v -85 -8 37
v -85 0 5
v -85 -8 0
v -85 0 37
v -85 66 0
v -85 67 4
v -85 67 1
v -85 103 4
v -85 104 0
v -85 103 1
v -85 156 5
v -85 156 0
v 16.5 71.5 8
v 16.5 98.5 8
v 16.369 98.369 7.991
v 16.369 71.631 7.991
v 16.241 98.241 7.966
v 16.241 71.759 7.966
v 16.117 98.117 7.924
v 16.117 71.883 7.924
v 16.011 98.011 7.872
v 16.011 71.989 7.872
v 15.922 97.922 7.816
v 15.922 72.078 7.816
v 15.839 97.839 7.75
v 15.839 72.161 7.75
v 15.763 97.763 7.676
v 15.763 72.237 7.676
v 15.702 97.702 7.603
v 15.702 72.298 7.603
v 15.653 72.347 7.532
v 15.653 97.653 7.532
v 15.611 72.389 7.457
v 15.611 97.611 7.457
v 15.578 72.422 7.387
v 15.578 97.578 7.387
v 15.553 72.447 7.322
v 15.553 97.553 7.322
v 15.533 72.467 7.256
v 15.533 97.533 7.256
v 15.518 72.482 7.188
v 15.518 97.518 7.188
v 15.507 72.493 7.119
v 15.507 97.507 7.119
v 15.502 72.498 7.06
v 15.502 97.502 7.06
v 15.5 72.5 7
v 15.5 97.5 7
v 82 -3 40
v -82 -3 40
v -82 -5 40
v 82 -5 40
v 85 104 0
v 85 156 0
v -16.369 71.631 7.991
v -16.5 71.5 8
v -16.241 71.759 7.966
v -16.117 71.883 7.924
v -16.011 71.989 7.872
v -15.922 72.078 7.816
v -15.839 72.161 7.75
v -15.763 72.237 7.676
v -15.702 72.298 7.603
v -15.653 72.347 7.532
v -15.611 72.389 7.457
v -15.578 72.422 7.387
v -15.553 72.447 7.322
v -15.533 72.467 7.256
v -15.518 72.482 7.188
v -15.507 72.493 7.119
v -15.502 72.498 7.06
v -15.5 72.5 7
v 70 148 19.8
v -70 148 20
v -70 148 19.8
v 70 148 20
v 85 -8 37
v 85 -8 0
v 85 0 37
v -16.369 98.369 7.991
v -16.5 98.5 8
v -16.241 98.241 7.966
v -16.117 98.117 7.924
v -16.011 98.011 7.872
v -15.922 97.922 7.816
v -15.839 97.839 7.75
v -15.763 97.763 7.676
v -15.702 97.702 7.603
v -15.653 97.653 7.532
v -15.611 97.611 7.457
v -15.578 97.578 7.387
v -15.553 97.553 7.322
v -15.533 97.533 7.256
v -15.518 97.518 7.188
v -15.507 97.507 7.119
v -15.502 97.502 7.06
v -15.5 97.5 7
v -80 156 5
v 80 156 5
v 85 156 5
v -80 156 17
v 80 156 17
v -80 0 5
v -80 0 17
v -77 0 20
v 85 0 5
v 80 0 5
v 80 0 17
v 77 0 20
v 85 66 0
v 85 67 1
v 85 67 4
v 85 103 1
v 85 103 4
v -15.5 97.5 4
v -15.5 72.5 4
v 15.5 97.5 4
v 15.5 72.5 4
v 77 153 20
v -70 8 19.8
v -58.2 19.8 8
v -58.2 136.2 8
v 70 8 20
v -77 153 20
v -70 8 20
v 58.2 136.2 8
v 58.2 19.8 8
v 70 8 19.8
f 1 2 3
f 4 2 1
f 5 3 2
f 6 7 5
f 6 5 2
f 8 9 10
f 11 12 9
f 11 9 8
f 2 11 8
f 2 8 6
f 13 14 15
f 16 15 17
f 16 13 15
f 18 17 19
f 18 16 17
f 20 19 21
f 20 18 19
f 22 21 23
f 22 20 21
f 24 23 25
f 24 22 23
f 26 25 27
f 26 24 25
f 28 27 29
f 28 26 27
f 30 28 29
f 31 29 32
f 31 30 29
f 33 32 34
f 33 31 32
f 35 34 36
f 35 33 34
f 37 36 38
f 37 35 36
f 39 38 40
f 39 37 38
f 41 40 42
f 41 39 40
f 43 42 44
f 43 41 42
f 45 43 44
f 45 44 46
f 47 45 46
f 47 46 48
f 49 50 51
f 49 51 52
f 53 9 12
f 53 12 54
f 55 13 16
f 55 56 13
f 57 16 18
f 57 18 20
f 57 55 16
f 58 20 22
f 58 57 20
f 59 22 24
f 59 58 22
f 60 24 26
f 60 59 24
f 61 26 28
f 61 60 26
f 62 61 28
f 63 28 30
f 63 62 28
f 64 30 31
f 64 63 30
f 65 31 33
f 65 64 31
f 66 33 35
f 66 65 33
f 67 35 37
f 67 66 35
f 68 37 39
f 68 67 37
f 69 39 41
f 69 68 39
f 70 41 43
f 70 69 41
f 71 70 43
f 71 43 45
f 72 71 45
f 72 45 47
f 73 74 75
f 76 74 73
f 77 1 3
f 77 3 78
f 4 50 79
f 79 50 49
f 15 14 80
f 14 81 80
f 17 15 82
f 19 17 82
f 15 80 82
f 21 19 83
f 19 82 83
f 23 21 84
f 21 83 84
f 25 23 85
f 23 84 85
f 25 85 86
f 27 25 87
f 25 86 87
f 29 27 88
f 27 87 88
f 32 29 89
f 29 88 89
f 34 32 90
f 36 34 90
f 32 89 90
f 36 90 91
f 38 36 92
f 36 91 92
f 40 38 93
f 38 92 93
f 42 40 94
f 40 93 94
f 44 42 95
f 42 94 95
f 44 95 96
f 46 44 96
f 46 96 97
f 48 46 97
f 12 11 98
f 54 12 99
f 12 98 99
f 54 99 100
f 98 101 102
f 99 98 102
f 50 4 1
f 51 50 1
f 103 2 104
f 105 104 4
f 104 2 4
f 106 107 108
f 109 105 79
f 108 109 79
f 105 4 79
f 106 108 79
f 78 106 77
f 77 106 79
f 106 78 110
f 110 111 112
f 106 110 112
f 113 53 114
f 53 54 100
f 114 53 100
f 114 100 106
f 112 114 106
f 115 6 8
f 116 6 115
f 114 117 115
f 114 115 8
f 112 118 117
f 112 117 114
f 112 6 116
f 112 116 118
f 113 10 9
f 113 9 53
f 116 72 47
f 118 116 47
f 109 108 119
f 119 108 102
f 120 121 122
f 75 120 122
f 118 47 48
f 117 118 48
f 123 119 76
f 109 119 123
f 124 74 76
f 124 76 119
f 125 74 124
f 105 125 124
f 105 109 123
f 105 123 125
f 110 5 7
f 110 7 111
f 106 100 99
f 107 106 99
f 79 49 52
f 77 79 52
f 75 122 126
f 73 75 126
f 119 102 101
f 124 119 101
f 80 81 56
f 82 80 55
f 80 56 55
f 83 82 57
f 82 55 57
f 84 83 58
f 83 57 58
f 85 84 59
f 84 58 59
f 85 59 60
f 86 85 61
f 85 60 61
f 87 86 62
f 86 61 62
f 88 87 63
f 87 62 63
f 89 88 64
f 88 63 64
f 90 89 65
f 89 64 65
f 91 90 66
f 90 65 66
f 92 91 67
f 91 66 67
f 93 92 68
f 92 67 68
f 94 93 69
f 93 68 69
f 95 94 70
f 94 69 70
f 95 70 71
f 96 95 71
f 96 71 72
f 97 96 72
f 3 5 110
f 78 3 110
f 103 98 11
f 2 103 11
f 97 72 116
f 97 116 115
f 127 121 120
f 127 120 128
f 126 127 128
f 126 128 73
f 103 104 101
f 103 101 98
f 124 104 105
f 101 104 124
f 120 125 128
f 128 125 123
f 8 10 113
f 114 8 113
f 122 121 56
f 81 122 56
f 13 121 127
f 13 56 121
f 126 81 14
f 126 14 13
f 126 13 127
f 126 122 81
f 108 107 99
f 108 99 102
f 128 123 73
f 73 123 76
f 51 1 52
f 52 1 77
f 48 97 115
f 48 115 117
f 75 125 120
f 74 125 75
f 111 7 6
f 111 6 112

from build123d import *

# Parameters (mm, degrees)
PAD_DEPTH       = 156
SKETCH001_W     = 31
SKETCH001_H     = 25
POCKET_DEPTH    = 20.001
SKETCH002_W     = 170
SKETCH002_H     = 36
POCKET001_DEPTH = 4
SKETCH003_W     = 140
SKETCH003_H     = 140
POCKET002_DEPTH = 12
SKETCH004_W     = 170
SKETCH004_H     = 40
PAD001_DEPTH    = 8
FILLET_R        = 1
CHAMFER_SIZE    = 3
CHAMFER001_SIZE = 1
CHAMFER002_SIZE = 3
CHAMFER003_SIZE = 11.8


with BuildPart() as part:
    # Sketch → Pad (new body)
    with BuildSketch(Plane.XZ):
        Polygon((-80, 20), (-80, 5), (-85, 5), (-85, 0), (85, 0), (85, 5), (80, 5), (80, 20), align=None)
    extrude(amount=-PAD_DEPTH)

    # Sketch001 (on Face2 of Pad) → Pocket (cut, through all)
    with BuildSketch(Plane.XY.offset(20)):
        with Locations((0, 85)):
            Rectangle(SKETCH001_W, SKETCH001_H)
    extrude(amount=-POCKET_DEPTH, mode=Mode.SUBTRACT)

    # Sketch002 (on Face14 of Pocket) → Pocket001 (cut)
    with BuildSketch(Plane(origin=(0, 0, 0), x_dir=(1, 0, 0), z_dir=(0, 0, -1))):
        with Locations((0, -85)):
            Rectangle(SKETCH002_W, SKETCH002_H)
    extrude(amount=-POCKET001_DEPTH, mode=Mode.SUBTRACT)

    # Sketch003 (on Face3 of Pocket001) → Pocket002 (cut)
    with BuildSketch(Plane.XY.offset(20)):
        with Locations((0, 78)):
            Rectangle(SKETCH003_W, SKETCH003_H)
    extrude(amount=-POCKET002_DEPTH, mode=Mode.SUBTRACT)

    # Sketch004 (on Face4 of Pocket002) → Pad001 (join)
    with BuildSketch(Plane.XZ):
        with Locations((0, 20)):
            Rectangle(SKETCH004_W, SKETCH004_H)
    extrude(amount=PAD001_DEPTH)

    # Fillet
    fillet_edges = [part.edges().sort_by_distance(p)[0] for p in [
        (0, 72.5, 8),
        (-15.5, 85, 8),
        (0, 97.5, 8),
        (15.5, 85, 8),
    ]]
    fillet(fillet_edges, radius=FILLET_R)

    # Chamfer
    chamfer_edges = [part.edges().sort_by_distance(p)[0] for p in [
        (-80, 78, 20),
        (0, 156, 20),
        (80, 78, 20),
    ]]
    chamfer(chamfer_edges, length=CHAMFER_SIZE)

    # Chamfer001
    chamfer001_edges = [part.edges().sort_by_distance(p)[0] for p in [
        (0, 67, 0),
        (0, 103, 0),
    ]]
    chamfer(chamfer001_edges, length=CHAMFER001_SIZE)

    # Chamfer002
    chamfer002_edges = [part.edges().sort_by_distance(p)[0] for p in [
        (0, 0, 40),
        (85, -4, 40),
        (0, -8, 40),
        (-85, -4, 40),
    ]]
    chamfer(chamfer002_edges, length=CHAMFER002_SIZE)

    # Chamfer003
    chamfer003_edges = [part.edges().sort_by_distance(p)[0] for p in [
        (0, 148, 8),
        (-70, 78, 8),
        (70, 78, 8),
        (0, 8, 8),
    ]]
    chamfer(chamfer003_edges, length=CHAMFER003_SIZE)


solid = part.part
